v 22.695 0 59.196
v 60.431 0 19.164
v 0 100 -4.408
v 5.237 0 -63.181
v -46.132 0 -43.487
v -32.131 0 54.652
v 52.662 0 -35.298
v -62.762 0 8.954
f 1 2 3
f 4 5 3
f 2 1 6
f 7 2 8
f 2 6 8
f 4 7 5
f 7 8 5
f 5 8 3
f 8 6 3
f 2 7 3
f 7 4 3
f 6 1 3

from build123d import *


with BuildPart() as f3:
    # F0 (on Front) → F3 section 0
    with BuildSketch(Plane.XZ, mode=Mode.PRIVATE) as f3_s0:
        Polygon((22.694931, 59.195888), (-32.13115, 54.651644), (-62.76182, 8.953598), (-46.13156, -43.48669), (5.236706, -63.180614), (52.661626, -35.298246), (60.431267, 19.16442), align=None)
    loft([f3_s0.sketch, Vertex(0, 100, -4.40801)])


solid = f3.part
